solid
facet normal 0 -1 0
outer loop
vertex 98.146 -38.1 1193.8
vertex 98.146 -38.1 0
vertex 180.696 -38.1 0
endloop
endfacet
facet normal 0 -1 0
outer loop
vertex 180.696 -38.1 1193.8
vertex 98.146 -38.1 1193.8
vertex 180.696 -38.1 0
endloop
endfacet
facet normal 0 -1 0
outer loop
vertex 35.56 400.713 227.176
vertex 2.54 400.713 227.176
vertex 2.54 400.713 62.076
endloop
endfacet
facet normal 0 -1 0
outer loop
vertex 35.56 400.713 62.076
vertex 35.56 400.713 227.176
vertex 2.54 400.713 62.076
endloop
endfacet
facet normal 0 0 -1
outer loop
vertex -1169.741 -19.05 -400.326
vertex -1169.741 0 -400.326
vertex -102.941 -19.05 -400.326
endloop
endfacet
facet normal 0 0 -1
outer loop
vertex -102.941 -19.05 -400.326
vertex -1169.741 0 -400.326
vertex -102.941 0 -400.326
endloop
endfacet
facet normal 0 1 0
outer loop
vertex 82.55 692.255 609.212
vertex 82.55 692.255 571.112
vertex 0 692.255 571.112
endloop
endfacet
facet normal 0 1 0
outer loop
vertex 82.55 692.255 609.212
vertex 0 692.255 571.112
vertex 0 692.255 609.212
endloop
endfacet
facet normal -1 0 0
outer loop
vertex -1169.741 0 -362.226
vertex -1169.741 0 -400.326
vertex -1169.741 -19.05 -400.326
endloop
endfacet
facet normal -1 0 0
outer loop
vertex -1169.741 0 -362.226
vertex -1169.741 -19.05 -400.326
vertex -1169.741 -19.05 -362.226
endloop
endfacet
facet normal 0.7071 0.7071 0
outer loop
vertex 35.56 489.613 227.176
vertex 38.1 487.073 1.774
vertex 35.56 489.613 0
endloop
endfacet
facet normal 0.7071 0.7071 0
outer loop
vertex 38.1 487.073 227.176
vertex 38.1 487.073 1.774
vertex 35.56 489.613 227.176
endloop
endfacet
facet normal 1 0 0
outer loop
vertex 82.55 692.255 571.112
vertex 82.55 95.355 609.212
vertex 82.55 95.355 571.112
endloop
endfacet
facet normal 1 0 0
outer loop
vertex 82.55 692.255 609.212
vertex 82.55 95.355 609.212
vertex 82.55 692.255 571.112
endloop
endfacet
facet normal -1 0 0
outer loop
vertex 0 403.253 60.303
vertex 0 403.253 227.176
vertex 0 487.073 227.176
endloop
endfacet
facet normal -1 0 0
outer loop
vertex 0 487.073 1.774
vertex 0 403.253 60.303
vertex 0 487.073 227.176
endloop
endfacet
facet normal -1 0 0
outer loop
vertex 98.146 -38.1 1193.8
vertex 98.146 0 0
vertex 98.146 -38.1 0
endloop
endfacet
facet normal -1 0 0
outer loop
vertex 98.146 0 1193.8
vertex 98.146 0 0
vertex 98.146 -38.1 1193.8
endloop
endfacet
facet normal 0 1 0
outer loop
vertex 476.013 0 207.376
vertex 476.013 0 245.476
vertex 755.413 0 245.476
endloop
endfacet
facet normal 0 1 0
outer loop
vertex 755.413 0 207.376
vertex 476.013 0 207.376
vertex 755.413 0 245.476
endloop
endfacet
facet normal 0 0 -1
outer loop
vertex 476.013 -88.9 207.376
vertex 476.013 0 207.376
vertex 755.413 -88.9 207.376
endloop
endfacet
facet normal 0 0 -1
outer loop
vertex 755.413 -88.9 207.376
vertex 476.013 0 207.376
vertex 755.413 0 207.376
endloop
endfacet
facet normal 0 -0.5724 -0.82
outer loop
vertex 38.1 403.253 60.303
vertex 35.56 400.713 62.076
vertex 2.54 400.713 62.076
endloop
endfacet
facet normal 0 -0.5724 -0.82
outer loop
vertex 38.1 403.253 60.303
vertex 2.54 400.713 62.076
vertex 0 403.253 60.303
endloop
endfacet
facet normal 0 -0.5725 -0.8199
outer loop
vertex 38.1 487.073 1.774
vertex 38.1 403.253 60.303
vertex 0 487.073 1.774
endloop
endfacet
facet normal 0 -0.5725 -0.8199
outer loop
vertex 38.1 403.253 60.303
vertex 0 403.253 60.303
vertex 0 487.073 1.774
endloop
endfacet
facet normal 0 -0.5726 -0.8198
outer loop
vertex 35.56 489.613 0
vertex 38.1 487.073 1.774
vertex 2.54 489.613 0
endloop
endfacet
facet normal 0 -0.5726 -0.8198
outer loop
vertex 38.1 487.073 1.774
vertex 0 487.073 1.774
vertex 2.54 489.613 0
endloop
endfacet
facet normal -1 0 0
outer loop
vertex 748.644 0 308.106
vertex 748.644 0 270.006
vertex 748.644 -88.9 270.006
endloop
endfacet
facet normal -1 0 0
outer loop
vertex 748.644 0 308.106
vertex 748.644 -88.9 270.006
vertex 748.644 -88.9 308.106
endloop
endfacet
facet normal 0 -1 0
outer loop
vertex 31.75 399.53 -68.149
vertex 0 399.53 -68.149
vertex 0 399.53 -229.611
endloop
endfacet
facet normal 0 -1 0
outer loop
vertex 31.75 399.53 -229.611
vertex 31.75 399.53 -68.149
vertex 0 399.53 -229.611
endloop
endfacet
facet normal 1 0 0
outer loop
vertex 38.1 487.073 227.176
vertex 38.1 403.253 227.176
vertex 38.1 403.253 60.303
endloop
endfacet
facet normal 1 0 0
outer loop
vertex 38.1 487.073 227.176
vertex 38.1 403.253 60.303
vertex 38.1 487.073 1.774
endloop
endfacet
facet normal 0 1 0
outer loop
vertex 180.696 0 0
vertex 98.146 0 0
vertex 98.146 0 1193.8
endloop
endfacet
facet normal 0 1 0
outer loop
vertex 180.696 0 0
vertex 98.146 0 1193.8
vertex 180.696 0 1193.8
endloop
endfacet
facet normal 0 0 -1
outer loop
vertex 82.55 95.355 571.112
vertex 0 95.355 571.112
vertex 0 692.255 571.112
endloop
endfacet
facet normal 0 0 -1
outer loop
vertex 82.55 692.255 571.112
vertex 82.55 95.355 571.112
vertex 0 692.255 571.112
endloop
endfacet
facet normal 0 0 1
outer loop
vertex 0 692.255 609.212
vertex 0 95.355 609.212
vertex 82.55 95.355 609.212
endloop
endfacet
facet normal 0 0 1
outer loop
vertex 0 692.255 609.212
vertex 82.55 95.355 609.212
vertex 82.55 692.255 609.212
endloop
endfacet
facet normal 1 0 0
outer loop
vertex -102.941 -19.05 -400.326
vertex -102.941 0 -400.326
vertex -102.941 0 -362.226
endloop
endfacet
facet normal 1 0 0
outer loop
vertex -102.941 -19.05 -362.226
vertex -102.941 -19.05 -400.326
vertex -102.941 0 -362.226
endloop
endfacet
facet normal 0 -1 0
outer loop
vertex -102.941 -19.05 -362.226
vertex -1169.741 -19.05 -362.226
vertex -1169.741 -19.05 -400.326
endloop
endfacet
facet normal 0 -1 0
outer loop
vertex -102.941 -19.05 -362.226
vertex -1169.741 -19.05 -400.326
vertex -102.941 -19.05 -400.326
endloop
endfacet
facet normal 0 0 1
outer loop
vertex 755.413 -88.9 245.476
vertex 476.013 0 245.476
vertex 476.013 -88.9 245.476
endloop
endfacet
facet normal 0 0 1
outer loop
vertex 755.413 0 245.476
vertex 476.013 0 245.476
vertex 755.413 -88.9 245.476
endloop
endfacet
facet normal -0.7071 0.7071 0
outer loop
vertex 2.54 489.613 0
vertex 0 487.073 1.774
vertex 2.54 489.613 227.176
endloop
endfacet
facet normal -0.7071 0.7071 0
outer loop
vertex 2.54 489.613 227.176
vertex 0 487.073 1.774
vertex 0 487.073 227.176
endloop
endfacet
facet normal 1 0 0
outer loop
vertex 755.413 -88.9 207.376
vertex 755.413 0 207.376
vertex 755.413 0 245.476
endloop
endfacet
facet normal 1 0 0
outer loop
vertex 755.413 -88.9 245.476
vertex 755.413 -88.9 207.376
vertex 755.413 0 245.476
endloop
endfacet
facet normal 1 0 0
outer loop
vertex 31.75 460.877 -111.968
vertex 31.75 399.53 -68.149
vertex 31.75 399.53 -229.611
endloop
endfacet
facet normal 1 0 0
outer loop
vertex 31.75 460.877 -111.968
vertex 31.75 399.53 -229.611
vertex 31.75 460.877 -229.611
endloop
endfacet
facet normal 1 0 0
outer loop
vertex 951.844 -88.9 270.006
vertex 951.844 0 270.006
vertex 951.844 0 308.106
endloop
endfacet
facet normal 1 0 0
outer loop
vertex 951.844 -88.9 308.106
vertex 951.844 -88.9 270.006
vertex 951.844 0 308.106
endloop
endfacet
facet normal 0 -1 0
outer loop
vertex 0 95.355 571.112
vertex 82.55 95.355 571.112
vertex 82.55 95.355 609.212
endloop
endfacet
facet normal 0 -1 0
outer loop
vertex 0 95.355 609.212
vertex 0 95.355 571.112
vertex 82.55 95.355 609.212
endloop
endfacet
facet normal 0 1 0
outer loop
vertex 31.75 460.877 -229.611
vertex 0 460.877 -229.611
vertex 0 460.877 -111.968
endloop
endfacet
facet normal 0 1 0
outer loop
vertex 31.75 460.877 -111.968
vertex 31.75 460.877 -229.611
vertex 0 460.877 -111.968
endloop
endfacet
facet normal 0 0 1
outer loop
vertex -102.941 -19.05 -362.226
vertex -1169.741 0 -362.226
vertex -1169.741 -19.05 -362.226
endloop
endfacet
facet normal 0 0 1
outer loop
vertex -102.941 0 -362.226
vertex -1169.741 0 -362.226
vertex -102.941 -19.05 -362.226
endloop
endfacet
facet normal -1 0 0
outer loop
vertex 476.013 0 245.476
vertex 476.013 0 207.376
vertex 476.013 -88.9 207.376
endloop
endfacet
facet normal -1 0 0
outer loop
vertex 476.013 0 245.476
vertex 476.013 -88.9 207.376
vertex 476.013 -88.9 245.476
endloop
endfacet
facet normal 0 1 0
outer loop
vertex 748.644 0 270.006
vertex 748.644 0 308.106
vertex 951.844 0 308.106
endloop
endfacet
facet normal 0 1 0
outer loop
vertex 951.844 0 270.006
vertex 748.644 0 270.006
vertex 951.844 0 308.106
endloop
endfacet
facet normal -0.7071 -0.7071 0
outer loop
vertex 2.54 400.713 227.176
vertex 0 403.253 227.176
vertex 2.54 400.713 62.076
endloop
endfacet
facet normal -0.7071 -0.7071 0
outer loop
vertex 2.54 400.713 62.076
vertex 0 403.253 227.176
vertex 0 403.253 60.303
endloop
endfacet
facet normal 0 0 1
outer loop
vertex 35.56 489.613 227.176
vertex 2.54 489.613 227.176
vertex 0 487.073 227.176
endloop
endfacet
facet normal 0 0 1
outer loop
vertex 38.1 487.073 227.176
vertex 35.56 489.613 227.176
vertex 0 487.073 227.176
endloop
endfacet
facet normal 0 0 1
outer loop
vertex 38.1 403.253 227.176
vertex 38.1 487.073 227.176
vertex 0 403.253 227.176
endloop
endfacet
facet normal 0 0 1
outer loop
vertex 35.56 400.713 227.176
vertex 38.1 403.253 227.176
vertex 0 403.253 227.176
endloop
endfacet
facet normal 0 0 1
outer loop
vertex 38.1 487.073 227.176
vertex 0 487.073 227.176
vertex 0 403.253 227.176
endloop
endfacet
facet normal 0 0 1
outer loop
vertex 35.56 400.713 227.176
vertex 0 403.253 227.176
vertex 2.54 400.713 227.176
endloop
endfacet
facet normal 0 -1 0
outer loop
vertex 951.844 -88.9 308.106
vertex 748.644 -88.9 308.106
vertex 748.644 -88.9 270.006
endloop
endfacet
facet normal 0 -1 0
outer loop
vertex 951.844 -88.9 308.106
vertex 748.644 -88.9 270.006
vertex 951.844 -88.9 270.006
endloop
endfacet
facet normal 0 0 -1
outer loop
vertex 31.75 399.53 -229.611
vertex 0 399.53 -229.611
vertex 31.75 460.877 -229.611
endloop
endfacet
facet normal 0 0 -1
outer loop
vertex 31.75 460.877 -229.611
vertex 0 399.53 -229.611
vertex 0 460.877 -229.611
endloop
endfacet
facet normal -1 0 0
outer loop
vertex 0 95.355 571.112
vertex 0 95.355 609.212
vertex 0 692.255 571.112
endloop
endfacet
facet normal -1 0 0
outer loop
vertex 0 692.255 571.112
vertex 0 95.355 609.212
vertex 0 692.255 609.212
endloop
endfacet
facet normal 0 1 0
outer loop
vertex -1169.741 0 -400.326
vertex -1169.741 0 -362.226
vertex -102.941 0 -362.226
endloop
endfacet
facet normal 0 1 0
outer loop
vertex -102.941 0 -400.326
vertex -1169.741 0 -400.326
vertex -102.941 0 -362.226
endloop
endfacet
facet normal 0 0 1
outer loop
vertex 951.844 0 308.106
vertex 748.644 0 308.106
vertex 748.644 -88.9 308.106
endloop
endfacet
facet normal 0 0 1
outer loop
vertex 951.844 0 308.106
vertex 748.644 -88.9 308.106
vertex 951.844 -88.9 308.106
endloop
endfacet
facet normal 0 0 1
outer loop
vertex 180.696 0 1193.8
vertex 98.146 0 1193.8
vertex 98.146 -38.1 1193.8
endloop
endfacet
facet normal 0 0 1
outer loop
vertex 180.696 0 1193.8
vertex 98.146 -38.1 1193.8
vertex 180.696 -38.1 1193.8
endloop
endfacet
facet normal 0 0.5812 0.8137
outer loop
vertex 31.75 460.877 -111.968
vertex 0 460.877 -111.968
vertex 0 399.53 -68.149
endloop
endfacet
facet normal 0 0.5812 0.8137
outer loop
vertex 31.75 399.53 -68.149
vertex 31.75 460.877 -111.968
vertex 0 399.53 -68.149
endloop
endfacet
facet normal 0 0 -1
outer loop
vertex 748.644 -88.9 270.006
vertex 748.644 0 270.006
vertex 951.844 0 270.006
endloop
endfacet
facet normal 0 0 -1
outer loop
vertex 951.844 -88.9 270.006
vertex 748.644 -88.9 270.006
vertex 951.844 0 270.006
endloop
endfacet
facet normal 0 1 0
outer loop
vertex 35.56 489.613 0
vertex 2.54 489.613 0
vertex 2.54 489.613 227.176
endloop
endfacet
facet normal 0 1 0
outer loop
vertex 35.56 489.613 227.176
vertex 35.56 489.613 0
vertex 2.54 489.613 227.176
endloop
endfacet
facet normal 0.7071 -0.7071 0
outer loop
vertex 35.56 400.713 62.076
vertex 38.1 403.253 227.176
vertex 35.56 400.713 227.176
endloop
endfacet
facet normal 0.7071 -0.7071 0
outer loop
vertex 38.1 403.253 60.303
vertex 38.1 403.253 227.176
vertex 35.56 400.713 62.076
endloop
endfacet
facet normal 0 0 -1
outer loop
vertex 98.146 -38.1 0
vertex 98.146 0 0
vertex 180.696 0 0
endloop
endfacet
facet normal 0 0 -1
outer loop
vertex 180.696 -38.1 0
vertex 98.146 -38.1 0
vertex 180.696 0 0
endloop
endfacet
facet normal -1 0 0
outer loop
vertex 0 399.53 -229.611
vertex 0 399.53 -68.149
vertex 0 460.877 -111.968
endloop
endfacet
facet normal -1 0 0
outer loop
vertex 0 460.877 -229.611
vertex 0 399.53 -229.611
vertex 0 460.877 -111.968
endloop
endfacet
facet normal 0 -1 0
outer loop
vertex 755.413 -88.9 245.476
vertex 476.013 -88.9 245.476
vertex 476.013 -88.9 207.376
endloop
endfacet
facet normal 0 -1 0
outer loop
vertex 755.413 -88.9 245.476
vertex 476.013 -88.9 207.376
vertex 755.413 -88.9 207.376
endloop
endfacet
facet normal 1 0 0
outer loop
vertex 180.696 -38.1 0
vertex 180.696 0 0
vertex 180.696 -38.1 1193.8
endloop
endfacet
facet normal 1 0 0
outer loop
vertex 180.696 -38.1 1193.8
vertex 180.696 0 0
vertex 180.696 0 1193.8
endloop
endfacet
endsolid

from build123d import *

# Parameters (mm, degrees)
F0_W      = 88.9
F0_H      = 254
F1_DEPTH  = 38.1
F2_R      = 2.54
F3_W      = 82.55
F3_H      = 1193.8
F4_DEPTH  = 38.1
F6_DEPTH  = 88.9
F7_R      = 2.54
F9_DEPTH  = 88.9
F10_R     = 2.54
F15_DEPTH = 38.1
F16_SIZE  = 2.54
F18_DEPTH = 38.1
F19_SIZE  = 2.54
F22_DEPTH = 31.75
F23_W     = 596.9
F23_H     = 38.1
F24_DEPTH = 82.55
F25_W     = 279.4
F25_H     = 38.1
F26_DEPTH = 88.9
F27_W     = 203.2
F27_H     = 38.1
F28_DEPTH = 88.9
F29_W     = 1066.8
F29_H     = 38.1
F30_DEPTH = 19.05


with BuildPart() as f1:
    # F0 (on Front) → F1 (new body)
    with BuildSketch(Plane.XZ):
        with Locations((44.45, 127)):
            Rectangle(F0_W, F0_H)
    extrude(amount=F1_DEPTH)

    # F2
    f2_edges = [f1.edges().sort_by_distance(p)[0] for p in [
        (0, 0, 127),
        (0, -38.1, 127),
        (88.9, -38.1, 127),
        (88.9, 0, 127),
    ]]
    fillet(f2_edges, radius=F2_R)


with BuildPart() as f4:
    # F3 (on Front) → F4 (new body)
    with BuildSketch(Plane.XZ):
        with Locations((139.420604, 596.9)):
            Rectangle(F3_W, F3_H)
    extrude(amount=F4_DEPTH)


with BuildPart() as f6:
    # F5 (on Right) → F6 (new body)
    with BuildSketch(Plane.YZ):
        Polygon((459.739979, 298.644233), (421.639979, 298.644233), (421.639979, 82.744233), (459.739979, 44.644233), align=None)
    extrude(amount=F6_DEPTH)

    # F7
    f7_edges = [f6.edges().sort_by_distance(p)[0] for p in [
        (88.9, 421.639979, 190.694233),
        (88.9, 459.739979, 171.644233),
        (0, 421.639979, 190.694233),
        (0, 459.739979, 171.644233),
    ]]
    fillet(f7_edges, radius=F7_R)


with BuildPart() as f9:
    # F8 (on Right) → F9 (new body)
    with BuildSketch(Plane.YZ):
        Polygon((427.989934, -1.270004), (427.989934, -255.270004), (466.089934, -255.270004), (466.089934, -39.370004), align=None)
    extrude(amount=F9_DEPTH)

    # F10
    f10_edges = [f9.edges().sort_by_distance(p)[0] for p in [
        (0, 427.989934, -128.270004),
        (88.9, 427.989934, -128.270004),
        (88.9, 466.089934, -147.320004),
        (0, 466.089934, -147.320004),
    ]]
    fillet(f10_edges, radius=F10_R)


with BuildPart() as f15:
    # F14 (on Right) → F15 (new body)
    with BuildSketch(Plane.YZ):
        Polygon((489.612907, 0), (489.612907, 227.176326), (400.712907, 227.176326), (400.712907, 62.076326), align=None)
    extrude(amount=F15_DEPTH)

    # F16
    f16_edges = [f15.edges().sort_by_distance(p)[0] for p in [
        (38.1, 400.712907, 144.626326),
        (38.1, 489.612907, 113.588163),
        (0, 489.612907, 113.588163),
        (0, 400.712907, 144.626326),
    ]]
    chamfer(f16_edges, length=F16_SIZE)


with BuildPart() as f18:
    # F17 (on Right) → F18 (new body)
    with BuildSketch(Plane.YZ):
        Polygon((374.346435, 712.469995), (374.346435, 547.369957), (463.246435, 547.369957), (463.246435, 775.969957), align=None)
    extrude(amount=F18_DEPTH)

    # F19
    f19_edges = [f18.edges().sort_by_distance(p)[0] for p in [
        (0, 374.346435, 629.919976),
        (38.1, 374.346435, 629.919976),
        (38.1, 463.246435, 661.669957),
        (0, 463.246435, 661.669957),
    ]]
    chamfer(f19_edges, length=F19_SIZE)


with BuildPart() as f22:
    # F21 (on Right) → F22 (new body)
    with BuildSketch(Plane.YZ):
        Polygon((460.876971, -111.968113), (399.530232, -68.149013), (399.530232, -229.611203), (460.876971, -229.611203), align=None)
    extrude(amount=F22_DEPTH)


with BuildPart() as f24:
    # F23 (on Right) → F24 (new body)
    with BuildSketch(Plane.YZ):
        with Locations((393.805131, 590.161679)):
            Rectangle(F23_W, F23_H)
    extrude(amount=F24_DEPTH)


with BuildPart() as f26:
    # F25 (on Front) → F26 (new body)
    with BuildSketch(Plane.XZ):
        with Locations((615.712936, 226.426033)):
            Rectangle(F25_W, F25_H)
    extrude(amount=F26_DEPTH)


with BuildPart() as f28:
    # F27 (on Front) → F28 (new body)
    with BuildSketch(Plane.XZ):
        with Locations((850.243619, 289.05612)):
            Rectangle(F27_W, F27_H)
    extrude(amount=F28_DEPTH)


with BuildPart() as f30:
    # F29 (on Front) → F30 (new body)
    with BuildSketch(Plane.XZ):
        with Locations((-636.341194, -381.275745)):
            Rectangle(F29_W, F29_H)
    extrude(amount=F30_DEPTH)


solid = Compound([f4.part, f15.part, f22.part, f24.part, f26.part, f28.part, f30.part])
